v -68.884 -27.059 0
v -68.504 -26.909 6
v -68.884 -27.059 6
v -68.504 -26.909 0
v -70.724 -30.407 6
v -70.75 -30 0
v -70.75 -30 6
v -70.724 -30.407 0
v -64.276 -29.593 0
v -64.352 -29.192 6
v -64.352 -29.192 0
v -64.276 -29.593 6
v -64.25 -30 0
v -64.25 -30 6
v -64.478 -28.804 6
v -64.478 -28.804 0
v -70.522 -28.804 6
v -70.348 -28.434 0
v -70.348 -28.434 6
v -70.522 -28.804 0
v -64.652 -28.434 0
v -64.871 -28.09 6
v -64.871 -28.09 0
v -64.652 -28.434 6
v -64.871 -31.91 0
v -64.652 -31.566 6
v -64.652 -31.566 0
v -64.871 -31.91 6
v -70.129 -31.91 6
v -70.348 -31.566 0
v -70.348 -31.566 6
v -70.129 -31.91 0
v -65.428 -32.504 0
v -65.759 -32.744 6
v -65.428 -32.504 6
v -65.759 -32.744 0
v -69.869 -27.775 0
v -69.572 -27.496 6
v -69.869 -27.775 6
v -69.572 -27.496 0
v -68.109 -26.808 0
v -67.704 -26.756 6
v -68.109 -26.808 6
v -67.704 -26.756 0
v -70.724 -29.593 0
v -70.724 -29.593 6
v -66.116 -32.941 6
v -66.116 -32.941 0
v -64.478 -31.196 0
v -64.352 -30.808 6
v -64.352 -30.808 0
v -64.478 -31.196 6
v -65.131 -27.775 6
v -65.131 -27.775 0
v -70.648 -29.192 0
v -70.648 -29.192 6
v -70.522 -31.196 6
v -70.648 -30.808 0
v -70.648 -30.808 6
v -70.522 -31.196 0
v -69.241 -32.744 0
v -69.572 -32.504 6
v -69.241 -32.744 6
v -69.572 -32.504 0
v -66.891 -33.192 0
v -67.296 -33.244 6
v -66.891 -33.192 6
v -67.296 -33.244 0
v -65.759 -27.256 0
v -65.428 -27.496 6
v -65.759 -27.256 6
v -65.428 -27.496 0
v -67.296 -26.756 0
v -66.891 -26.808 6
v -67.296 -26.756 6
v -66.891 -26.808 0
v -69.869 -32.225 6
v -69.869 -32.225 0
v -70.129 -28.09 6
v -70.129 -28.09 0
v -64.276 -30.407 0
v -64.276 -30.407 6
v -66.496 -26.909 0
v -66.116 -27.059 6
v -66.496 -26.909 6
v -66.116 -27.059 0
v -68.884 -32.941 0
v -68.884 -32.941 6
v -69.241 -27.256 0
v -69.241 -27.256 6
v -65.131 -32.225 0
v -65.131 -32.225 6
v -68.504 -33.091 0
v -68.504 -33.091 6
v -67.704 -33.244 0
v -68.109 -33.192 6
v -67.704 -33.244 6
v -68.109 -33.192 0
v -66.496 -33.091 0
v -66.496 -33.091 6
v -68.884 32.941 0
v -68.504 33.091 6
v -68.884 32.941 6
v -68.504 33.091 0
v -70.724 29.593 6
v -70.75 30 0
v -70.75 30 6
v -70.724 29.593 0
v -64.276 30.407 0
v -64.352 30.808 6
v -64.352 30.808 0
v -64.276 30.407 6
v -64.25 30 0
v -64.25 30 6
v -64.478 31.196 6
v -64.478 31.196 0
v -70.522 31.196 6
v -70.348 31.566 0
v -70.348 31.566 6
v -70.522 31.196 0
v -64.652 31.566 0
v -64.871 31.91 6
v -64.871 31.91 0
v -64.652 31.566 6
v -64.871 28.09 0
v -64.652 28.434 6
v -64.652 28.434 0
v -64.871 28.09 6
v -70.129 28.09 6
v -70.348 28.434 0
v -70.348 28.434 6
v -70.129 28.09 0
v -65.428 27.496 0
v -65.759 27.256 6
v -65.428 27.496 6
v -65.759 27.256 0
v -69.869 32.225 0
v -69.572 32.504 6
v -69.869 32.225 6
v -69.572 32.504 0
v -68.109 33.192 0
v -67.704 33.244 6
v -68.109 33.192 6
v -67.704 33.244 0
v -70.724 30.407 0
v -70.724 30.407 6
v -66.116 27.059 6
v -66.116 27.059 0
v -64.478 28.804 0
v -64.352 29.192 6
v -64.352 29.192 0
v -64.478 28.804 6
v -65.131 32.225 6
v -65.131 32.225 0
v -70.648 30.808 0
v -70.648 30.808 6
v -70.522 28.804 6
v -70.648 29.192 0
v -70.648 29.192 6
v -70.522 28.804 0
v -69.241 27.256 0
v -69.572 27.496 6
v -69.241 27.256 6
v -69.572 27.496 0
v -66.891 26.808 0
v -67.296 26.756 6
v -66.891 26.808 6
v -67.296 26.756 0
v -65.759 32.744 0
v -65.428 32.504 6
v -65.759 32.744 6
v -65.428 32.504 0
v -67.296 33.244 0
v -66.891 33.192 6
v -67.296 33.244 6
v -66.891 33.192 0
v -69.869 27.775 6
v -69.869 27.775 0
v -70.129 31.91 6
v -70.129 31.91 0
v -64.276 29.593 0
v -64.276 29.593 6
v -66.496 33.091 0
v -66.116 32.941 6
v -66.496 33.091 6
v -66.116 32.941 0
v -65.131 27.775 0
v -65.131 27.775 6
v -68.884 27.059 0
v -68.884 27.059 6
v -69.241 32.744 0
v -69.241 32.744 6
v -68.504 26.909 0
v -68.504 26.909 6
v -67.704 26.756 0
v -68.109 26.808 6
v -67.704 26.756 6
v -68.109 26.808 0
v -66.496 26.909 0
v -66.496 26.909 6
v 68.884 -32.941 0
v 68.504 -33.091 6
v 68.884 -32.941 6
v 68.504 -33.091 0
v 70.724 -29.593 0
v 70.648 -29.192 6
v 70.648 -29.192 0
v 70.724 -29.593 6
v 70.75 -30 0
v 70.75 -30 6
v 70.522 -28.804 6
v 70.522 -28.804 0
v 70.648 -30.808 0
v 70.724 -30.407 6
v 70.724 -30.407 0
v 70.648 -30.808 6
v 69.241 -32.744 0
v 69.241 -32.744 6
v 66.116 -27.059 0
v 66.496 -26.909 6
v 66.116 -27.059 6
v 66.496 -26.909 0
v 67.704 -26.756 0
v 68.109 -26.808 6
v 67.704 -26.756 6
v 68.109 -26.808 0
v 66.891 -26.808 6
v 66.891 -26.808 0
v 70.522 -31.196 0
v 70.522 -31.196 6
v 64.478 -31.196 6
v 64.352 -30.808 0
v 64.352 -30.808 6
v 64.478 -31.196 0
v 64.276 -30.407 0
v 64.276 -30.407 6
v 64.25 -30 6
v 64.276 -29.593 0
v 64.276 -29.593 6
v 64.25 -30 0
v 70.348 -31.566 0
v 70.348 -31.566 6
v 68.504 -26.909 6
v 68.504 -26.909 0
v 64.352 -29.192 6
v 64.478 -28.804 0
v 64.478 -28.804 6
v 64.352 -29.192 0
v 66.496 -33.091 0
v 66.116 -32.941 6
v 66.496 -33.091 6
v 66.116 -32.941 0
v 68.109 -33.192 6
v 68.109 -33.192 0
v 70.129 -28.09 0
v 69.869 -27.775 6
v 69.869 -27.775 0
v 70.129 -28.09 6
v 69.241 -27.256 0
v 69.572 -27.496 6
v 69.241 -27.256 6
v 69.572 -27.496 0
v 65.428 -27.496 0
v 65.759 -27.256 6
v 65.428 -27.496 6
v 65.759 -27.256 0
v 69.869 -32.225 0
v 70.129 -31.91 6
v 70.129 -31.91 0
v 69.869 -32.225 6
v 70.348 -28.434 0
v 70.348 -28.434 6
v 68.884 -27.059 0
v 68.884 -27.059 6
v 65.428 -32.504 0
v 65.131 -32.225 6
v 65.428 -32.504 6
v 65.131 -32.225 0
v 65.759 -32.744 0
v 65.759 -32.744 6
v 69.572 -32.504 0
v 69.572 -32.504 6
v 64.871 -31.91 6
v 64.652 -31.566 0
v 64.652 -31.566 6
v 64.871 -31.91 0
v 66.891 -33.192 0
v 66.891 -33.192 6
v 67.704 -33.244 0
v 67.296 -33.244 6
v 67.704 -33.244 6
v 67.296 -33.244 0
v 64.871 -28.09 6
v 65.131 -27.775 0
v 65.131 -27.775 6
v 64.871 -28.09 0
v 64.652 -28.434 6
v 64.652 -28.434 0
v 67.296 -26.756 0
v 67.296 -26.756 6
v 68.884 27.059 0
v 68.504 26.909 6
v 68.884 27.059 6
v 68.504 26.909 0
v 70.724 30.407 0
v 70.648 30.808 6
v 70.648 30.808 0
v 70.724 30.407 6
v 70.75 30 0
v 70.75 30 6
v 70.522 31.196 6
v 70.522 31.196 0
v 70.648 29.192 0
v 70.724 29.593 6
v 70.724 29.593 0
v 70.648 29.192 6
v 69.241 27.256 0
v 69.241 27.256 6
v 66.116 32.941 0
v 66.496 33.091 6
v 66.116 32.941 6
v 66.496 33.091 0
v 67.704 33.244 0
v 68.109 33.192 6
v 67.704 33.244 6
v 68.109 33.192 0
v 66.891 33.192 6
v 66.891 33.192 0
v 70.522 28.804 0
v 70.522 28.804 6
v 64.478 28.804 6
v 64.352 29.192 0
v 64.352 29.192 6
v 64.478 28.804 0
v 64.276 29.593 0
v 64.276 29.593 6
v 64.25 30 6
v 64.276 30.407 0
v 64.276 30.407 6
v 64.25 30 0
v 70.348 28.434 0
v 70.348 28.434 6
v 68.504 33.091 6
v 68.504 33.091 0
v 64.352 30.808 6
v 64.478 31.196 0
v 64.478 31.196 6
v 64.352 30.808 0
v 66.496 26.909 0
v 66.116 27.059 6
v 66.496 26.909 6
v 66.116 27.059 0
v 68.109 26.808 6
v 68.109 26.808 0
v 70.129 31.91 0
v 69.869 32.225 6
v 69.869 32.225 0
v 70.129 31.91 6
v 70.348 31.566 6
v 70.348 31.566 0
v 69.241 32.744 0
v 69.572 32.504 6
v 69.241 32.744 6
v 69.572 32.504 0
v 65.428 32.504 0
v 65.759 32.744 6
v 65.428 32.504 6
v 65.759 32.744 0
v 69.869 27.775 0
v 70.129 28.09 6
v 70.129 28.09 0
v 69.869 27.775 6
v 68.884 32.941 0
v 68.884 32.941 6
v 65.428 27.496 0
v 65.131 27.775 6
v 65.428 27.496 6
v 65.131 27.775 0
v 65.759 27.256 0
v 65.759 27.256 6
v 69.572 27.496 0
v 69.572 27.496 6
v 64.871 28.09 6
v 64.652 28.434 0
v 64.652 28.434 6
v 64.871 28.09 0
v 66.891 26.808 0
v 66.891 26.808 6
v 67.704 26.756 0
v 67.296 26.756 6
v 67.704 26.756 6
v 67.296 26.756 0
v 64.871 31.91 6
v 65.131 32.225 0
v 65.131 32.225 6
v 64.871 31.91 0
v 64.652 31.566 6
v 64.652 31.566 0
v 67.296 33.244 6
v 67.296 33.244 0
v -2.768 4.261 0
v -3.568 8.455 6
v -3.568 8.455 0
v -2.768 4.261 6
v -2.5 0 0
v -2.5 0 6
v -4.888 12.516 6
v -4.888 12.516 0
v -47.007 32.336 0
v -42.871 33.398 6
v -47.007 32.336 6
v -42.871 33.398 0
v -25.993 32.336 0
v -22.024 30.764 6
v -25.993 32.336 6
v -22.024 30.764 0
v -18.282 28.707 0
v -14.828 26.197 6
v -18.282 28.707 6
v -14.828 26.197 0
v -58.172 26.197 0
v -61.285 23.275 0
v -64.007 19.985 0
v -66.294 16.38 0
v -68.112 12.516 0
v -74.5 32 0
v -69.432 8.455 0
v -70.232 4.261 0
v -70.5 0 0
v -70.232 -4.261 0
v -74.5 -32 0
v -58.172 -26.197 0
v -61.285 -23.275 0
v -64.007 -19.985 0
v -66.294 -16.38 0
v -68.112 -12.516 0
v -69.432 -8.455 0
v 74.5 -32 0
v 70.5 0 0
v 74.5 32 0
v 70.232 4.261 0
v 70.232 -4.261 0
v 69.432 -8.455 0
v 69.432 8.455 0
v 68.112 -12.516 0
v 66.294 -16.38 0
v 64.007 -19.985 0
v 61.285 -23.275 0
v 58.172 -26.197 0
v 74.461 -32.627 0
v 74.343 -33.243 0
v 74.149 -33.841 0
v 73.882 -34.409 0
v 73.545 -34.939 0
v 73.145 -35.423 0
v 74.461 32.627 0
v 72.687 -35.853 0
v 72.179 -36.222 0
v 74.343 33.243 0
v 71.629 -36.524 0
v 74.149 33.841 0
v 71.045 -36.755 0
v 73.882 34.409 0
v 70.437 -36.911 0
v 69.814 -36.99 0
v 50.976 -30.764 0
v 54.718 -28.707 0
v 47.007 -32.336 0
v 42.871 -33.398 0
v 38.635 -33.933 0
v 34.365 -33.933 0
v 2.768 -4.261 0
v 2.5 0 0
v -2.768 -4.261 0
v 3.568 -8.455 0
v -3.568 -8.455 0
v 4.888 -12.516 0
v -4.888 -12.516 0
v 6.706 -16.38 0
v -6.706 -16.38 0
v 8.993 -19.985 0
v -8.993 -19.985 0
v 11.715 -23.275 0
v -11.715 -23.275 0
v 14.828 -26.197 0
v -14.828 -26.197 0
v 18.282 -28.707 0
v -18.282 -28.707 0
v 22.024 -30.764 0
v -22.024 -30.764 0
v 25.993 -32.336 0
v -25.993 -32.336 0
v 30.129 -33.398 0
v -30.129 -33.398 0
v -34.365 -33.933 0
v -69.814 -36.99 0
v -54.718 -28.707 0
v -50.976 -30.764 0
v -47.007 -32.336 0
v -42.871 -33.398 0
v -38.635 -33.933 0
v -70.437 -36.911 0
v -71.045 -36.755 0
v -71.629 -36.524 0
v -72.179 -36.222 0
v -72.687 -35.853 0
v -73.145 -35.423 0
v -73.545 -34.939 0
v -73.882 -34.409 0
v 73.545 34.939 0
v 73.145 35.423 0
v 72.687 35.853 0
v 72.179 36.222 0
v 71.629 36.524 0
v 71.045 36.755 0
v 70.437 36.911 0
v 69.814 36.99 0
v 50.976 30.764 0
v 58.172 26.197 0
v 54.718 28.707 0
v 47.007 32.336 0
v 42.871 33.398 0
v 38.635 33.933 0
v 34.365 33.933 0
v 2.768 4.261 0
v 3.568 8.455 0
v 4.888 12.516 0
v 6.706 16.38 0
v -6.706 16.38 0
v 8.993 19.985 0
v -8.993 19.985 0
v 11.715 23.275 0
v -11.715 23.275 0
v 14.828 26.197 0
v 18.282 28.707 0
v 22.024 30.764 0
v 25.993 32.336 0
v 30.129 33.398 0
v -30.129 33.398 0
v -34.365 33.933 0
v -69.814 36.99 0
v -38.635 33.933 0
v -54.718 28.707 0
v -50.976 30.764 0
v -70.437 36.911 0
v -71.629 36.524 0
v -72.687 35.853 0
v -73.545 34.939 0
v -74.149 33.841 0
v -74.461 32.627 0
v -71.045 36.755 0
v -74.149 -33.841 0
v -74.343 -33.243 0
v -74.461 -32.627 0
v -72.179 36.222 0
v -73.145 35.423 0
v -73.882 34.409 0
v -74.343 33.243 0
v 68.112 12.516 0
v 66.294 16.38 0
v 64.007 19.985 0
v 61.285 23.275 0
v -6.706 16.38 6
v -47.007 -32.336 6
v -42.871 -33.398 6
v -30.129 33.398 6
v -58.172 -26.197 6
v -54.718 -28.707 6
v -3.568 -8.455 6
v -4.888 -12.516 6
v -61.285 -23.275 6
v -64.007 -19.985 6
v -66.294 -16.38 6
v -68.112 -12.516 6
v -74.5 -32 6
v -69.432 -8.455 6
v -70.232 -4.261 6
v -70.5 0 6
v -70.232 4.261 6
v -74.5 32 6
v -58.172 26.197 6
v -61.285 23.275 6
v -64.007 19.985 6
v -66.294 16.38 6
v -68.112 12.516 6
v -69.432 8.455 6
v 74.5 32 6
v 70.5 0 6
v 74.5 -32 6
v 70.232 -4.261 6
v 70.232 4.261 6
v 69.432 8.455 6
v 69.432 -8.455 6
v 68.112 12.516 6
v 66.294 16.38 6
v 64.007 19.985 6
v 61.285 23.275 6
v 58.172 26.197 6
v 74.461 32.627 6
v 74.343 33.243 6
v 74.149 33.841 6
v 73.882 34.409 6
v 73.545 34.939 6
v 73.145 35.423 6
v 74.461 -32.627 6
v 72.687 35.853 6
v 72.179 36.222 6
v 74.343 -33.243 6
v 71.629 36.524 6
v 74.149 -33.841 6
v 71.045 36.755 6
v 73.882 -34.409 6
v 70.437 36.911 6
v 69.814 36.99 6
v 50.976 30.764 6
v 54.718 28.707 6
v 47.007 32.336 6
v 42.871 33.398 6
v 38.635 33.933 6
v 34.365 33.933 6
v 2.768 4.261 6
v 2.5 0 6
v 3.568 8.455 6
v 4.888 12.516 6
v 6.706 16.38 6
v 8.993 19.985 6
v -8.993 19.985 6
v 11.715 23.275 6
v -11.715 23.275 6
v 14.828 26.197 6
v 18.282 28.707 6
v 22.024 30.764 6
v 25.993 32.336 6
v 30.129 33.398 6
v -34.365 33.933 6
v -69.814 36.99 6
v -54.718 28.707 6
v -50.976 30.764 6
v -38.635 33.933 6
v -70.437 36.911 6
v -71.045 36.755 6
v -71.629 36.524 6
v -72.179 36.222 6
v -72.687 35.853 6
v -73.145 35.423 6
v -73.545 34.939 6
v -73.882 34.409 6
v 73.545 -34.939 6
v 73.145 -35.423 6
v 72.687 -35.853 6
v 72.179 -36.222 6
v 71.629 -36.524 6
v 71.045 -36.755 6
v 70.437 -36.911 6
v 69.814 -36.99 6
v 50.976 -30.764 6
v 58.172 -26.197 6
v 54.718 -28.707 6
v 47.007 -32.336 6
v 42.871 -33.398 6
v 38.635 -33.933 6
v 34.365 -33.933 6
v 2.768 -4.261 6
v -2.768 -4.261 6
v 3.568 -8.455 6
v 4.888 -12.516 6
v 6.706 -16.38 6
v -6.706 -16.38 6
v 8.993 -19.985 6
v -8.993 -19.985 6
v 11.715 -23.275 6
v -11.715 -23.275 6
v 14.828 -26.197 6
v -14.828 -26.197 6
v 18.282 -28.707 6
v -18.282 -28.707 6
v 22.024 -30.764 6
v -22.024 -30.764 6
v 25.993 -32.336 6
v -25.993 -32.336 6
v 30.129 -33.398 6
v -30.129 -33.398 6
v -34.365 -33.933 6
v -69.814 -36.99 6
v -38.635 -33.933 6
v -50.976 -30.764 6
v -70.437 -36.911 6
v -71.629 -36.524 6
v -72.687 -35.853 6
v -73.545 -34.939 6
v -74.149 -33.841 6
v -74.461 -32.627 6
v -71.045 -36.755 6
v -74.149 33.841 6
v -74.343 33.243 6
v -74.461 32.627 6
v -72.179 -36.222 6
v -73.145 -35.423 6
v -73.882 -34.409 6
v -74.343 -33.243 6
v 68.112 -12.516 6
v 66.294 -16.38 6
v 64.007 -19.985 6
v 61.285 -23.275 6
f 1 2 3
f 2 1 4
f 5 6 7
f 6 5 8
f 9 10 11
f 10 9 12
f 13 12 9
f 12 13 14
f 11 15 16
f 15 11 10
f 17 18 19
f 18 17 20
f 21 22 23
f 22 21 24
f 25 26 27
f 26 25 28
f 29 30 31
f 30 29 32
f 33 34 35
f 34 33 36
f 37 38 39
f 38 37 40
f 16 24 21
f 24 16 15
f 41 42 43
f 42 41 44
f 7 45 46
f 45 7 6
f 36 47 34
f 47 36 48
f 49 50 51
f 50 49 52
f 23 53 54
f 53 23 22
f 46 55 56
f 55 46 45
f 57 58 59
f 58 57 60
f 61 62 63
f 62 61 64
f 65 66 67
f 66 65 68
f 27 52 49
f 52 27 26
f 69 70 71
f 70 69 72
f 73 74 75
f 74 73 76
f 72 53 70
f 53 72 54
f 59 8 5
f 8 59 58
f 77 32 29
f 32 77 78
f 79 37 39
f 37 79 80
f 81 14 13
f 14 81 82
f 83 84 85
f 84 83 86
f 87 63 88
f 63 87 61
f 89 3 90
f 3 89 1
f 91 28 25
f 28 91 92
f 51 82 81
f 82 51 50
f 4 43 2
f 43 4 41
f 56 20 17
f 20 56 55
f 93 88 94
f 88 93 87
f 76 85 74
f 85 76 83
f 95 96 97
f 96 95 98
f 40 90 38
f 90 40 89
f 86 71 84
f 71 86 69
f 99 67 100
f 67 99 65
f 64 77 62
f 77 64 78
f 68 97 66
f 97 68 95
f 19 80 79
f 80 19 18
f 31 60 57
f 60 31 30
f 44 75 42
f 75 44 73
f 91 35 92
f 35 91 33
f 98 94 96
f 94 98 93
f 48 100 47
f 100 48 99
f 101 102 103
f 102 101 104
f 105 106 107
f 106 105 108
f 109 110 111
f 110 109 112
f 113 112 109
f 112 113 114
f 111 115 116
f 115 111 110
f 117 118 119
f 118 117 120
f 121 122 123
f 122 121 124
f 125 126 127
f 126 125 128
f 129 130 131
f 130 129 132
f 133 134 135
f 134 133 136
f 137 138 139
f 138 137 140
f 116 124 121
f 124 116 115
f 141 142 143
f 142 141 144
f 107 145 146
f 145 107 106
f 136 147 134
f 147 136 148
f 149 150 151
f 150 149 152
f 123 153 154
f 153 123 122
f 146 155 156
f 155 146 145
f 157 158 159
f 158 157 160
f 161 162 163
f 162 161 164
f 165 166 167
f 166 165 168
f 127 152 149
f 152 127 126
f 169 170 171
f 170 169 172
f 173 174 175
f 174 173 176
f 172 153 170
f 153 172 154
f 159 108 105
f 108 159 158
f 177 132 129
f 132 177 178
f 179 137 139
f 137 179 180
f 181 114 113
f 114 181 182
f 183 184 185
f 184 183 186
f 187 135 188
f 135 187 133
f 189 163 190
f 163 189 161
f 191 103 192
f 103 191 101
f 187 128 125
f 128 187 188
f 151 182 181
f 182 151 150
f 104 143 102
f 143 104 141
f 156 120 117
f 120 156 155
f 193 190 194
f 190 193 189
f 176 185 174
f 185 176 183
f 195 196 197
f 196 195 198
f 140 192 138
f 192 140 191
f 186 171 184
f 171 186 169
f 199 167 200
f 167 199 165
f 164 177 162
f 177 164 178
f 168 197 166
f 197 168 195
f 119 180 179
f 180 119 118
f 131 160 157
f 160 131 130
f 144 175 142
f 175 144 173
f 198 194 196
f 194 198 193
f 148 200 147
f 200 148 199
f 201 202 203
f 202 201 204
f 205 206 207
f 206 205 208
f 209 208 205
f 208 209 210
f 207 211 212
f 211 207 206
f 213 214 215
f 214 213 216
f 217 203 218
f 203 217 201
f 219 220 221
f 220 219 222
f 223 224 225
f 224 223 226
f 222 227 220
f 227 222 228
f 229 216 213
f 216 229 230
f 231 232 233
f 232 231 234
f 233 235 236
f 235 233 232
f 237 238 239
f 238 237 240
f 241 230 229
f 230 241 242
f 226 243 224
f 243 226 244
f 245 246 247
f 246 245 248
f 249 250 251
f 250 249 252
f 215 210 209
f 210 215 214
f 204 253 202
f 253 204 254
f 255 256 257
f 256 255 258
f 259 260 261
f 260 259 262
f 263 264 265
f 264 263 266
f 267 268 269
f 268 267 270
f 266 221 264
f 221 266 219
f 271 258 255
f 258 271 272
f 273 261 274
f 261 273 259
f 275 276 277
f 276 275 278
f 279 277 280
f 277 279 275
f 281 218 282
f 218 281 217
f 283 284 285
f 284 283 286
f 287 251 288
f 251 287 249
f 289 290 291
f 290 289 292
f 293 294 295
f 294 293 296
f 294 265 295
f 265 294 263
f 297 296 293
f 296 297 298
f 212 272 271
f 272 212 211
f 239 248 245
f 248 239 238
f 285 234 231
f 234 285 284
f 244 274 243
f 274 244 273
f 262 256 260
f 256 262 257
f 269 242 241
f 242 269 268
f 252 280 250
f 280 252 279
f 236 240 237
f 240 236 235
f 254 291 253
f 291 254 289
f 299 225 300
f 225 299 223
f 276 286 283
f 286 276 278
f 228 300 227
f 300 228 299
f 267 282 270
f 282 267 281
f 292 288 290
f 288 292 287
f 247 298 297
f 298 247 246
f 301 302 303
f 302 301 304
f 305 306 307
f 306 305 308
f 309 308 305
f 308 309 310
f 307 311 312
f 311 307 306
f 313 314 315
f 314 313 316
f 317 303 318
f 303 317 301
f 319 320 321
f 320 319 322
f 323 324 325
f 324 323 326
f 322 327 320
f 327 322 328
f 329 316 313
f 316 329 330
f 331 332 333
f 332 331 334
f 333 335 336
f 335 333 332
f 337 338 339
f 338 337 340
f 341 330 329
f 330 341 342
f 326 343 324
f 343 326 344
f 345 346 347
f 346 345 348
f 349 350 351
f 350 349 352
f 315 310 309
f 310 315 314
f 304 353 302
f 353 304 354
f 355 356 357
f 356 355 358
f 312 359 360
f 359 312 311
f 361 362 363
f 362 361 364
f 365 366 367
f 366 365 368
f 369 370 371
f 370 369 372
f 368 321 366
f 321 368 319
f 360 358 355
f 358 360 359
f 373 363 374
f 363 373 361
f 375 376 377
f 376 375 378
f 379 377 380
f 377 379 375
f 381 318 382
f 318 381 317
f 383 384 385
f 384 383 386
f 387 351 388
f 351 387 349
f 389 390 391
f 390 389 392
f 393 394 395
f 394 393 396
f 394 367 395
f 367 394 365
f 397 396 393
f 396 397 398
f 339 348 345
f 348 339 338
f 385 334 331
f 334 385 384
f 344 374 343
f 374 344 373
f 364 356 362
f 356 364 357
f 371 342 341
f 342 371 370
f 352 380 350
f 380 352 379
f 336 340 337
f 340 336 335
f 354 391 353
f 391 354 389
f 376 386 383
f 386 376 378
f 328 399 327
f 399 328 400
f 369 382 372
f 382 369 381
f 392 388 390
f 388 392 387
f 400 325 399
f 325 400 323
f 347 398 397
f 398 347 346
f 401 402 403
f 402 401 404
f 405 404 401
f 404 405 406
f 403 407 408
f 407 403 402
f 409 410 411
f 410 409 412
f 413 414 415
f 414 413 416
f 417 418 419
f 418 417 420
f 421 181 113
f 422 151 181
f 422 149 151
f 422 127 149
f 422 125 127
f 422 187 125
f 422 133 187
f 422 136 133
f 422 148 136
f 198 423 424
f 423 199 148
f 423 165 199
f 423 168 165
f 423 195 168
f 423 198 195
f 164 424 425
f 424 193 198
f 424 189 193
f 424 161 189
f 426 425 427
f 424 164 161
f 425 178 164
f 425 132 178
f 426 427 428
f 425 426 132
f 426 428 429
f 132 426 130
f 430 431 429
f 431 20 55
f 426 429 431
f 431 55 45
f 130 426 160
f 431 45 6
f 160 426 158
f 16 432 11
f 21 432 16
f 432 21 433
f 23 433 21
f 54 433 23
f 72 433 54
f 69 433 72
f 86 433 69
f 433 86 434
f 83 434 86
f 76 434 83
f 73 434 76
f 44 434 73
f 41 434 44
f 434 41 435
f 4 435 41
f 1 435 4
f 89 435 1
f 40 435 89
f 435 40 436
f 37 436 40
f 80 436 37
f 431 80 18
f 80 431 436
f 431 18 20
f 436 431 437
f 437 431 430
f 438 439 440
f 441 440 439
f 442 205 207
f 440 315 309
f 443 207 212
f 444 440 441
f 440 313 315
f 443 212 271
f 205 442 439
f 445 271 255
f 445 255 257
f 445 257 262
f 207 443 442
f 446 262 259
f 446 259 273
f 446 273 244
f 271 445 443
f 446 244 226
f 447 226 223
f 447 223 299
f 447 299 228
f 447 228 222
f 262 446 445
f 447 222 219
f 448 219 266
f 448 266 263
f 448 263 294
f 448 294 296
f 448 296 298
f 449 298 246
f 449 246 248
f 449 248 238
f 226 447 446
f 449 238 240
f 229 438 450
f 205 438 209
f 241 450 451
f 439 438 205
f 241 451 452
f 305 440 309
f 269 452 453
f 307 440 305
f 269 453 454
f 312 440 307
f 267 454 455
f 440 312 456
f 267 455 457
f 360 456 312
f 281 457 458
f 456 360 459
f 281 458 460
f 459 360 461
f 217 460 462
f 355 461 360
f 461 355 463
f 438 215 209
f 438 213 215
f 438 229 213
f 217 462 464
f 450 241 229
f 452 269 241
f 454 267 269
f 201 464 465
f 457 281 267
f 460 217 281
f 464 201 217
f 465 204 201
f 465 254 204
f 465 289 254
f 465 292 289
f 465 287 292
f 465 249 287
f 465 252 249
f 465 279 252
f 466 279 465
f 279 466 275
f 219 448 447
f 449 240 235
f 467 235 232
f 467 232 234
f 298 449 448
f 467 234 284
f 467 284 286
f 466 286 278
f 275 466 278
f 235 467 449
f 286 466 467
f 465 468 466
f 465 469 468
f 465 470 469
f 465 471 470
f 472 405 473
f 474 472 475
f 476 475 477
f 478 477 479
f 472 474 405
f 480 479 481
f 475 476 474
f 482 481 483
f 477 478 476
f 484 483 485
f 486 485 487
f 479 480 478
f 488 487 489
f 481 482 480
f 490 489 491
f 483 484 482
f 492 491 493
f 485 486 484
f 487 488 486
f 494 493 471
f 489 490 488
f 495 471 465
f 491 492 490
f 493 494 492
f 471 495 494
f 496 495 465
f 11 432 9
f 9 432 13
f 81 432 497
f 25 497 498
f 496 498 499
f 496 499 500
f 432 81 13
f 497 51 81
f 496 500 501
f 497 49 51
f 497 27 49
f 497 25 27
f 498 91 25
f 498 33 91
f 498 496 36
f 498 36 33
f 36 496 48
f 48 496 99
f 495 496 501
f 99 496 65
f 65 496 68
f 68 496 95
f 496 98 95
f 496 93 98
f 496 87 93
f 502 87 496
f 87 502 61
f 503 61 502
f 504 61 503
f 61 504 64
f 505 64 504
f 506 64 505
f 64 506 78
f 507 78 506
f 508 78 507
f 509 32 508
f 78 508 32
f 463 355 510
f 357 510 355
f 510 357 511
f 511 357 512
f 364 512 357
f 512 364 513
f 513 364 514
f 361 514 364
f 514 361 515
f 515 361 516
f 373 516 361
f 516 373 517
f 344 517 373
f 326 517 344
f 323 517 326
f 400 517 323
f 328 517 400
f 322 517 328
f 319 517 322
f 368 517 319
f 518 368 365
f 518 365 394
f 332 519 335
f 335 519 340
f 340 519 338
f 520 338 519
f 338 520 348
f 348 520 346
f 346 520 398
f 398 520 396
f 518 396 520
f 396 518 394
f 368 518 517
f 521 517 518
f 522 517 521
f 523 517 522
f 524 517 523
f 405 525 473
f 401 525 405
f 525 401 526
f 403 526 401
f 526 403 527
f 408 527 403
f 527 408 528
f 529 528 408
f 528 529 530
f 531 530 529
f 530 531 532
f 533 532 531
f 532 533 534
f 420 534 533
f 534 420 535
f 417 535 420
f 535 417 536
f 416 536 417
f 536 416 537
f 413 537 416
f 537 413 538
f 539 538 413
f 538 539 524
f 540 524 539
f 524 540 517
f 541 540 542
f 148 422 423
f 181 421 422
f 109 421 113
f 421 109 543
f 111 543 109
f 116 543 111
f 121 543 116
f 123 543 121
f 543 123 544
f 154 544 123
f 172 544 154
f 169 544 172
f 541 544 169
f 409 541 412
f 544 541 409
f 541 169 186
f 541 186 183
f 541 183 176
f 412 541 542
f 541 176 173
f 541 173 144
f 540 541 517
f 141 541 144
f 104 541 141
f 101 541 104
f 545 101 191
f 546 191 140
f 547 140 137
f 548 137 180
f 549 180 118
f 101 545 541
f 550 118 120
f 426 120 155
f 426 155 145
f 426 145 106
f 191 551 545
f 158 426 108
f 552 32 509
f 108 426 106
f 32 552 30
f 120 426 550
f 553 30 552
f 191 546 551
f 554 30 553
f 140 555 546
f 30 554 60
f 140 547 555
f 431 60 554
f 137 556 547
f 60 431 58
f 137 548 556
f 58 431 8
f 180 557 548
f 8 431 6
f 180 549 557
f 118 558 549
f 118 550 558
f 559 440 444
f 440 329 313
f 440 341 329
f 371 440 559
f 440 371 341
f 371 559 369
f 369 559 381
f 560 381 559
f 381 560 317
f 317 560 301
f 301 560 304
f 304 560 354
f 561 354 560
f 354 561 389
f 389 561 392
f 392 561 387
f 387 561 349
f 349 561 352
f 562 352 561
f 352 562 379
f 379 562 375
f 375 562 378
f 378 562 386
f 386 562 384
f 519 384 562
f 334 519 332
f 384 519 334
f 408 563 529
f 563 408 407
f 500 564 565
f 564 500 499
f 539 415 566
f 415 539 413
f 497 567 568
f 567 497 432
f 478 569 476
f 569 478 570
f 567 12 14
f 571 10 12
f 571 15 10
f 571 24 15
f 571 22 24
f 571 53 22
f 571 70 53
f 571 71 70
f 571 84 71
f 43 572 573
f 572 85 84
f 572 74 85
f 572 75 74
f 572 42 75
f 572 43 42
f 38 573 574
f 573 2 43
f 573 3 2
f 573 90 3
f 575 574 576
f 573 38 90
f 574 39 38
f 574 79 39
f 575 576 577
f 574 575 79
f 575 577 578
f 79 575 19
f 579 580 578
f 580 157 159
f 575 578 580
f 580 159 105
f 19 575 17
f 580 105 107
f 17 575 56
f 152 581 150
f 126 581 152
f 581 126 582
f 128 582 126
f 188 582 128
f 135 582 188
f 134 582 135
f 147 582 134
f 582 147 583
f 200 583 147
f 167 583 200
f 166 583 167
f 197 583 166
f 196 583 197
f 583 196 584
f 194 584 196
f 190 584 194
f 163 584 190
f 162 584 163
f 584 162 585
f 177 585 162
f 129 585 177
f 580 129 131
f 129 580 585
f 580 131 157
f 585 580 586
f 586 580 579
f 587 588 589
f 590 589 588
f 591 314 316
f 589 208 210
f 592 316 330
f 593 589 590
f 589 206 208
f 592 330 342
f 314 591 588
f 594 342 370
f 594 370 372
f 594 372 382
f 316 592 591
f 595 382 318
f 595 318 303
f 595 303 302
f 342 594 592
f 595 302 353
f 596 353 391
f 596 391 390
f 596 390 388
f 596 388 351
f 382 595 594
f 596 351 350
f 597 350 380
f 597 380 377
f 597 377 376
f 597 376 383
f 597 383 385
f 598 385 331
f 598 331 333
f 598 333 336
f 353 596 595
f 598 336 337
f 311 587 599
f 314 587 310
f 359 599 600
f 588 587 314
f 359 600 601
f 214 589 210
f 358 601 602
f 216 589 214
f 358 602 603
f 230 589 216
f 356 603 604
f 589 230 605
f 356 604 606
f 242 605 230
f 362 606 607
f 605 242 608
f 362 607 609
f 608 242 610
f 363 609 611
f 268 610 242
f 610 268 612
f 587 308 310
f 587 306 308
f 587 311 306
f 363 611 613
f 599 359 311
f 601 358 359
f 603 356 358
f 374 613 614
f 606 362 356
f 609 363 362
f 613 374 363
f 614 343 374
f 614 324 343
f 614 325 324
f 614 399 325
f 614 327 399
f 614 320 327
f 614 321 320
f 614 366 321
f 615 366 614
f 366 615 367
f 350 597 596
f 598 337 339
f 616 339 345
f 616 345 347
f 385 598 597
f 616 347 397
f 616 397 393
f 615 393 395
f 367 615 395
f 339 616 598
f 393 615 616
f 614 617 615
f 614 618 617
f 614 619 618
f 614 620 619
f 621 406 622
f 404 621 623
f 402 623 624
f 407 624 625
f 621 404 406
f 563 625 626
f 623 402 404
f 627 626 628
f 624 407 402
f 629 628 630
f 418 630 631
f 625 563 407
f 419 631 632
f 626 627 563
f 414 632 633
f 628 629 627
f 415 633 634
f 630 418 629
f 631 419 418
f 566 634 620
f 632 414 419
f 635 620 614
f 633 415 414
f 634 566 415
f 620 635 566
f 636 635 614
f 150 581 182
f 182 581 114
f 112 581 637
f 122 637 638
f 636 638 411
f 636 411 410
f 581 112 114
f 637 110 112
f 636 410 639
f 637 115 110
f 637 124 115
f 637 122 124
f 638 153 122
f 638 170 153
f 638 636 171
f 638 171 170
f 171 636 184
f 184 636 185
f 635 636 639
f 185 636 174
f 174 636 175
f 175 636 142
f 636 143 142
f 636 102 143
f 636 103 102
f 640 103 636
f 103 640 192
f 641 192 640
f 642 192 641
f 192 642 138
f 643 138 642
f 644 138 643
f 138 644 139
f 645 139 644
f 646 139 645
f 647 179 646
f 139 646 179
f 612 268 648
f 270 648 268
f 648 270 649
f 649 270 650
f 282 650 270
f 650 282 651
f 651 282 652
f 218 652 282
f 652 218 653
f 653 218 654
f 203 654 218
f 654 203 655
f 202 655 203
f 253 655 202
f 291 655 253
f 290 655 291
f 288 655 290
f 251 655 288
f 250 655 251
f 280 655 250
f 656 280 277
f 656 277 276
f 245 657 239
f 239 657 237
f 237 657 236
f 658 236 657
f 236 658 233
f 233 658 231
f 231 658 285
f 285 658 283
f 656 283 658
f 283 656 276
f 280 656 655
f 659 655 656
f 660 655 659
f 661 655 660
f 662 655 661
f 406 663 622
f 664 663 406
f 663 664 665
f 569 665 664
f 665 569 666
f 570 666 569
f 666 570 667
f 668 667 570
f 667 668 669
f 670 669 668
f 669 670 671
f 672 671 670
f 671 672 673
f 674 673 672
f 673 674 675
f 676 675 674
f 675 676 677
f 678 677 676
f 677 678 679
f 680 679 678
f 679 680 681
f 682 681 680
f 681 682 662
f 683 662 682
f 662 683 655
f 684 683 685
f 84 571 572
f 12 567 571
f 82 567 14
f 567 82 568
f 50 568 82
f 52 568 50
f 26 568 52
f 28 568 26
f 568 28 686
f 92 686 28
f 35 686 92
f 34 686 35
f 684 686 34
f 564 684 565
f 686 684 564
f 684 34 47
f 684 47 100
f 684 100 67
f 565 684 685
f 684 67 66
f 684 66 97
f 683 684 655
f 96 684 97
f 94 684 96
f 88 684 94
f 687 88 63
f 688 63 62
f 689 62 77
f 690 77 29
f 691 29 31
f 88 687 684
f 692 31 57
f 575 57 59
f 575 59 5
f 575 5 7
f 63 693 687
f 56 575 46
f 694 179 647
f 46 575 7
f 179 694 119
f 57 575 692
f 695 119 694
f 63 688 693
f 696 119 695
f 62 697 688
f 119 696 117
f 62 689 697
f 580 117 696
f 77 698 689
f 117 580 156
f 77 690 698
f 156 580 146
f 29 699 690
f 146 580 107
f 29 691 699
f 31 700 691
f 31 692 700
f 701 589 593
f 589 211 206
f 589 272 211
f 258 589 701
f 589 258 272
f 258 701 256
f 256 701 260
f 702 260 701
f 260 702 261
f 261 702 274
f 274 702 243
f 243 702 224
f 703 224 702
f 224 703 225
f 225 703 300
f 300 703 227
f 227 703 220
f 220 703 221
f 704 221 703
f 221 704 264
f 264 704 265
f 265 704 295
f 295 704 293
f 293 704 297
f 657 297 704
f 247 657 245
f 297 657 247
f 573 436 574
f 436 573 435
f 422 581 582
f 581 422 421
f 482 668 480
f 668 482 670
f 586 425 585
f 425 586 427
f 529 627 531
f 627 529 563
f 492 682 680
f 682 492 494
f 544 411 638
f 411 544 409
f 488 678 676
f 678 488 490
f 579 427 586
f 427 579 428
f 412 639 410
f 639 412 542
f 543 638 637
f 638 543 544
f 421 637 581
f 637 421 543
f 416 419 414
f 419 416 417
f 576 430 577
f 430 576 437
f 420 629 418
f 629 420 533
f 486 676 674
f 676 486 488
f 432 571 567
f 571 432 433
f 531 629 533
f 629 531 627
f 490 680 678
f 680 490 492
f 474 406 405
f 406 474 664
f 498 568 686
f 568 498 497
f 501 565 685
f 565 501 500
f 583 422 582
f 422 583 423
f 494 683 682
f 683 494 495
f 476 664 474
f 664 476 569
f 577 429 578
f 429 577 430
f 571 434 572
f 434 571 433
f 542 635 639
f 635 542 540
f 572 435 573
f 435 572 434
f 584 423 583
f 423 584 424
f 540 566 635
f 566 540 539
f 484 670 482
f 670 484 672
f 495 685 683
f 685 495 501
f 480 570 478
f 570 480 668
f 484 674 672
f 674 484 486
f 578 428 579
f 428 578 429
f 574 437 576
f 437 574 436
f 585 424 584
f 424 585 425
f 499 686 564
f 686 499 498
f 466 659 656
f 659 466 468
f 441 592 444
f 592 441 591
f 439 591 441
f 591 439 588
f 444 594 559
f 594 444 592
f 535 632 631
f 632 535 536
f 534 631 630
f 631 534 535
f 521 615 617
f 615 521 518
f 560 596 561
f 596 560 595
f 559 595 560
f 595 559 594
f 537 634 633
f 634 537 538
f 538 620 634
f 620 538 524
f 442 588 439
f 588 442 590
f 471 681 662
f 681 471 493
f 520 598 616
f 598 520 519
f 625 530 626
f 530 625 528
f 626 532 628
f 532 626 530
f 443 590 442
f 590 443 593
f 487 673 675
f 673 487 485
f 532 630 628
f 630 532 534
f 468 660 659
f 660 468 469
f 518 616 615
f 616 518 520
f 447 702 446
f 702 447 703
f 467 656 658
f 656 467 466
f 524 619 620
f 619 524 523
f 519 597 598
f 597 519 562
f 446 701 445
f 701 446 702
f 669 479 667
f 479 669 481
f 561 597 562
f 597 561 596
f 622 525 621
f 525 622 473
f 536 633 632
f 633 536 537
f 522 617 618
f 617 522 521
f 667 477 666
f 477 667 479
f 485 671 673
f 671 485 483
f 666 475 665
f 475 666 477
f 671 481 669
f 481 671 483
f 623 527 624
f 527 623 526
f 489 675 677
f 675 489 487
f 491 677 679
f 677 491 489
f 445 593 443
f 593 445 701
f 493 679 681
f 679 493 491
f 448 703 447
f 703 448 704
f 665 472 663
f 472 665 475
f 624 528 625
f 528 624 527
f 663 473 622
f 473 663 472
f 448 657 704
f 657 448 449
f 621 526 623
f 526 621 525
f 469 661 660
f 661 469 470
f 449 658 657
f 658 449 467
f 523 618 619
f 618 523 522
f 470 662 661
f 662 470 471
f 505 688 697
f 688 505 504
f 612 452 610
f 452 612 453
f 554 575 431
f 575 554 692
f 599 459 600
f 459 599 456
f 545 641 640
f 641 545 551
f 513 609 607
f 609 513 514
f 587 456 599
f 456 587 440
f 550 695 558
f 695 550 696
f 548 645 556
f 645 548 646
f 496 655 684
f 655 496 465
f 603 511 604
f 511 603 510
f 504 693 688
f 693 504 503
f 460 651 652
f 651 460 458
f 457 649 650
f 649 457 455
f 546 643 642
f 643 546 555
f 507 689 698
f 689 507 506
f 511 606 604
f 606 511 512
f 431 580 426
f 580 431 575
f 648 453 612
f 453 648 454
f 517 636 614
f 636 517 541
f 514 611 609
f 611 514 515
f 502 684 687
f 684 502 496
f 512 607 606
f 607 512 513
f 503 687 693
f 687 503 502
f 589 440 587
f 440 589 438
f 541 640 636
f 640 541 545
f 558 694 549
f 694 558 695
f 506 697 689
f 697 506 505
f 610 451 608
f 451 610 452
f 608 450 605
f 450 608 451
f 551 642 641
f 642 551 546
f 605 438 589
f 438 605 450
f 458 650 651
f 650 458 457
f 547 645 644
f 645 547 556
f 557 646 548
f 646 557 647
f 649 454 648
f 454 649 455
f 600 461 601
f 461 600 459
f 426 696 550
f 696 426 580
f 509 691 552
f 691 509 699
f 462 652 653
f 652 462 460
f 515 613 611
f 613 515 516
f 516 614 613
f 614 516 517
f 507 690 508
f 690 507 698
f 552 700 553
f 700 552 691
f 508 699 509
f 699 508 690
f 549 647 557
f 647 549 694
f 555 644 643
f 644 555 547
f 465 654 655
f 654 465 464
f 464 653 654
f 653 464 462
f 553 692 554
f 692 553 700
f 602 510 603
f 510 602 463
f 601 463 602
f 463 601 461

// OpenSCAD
$fn = 50;


difference() {
	union() {
		hull() {
			translate(v = [-69.5000000000, 32.0000000000, 0]) {
				cylinder(h = 6, r = 5);
			}
			translate(v = [69.5000000000, 32.0000000000, 0]) {
				cylinder(h = 6, r = 5);
			}
			translate(v = [-69.5000000000, -32.0000000000, 0]) {
				cylinder(h = 6, r = 5);
			}
			translate(v = [69.5000000000, -32.0000000000, 0]) {
				cylinder(h = 6, r = 5);
			}
		}
	}
	union() {
		#translate(v = [-67.5000000000, -30.0000000000, -100.0000000000]) {
			cylinder(h = 200, r = 3.2500000000);
		}
		#translate(v = [-67.5000000000, 30.0000000000, -100.0000000000]) {
			cylinder(h = 200, r = 3.2500000000);
		}
		#translate(v = [67.5000000000, -30.0000000000, -100.0000000000]) {
			cylinder(h = 200, r = 3.2500000000);
		}
		#translate(v = [67.5000000000, 30.0000000000, -100.0000000000]) {
			cylinder(h = 200, r = 3.2500000000);
		}
		#translate(v = [-36.5000000000, 0, 0]) {
			cylinder(h = 6, r = 34.0000000000);
		}
		#translate(v = [36.5000000000, 0, 0]) {
			cylinder(h = 6, r = 34.0000000000);
		}
	}
}
